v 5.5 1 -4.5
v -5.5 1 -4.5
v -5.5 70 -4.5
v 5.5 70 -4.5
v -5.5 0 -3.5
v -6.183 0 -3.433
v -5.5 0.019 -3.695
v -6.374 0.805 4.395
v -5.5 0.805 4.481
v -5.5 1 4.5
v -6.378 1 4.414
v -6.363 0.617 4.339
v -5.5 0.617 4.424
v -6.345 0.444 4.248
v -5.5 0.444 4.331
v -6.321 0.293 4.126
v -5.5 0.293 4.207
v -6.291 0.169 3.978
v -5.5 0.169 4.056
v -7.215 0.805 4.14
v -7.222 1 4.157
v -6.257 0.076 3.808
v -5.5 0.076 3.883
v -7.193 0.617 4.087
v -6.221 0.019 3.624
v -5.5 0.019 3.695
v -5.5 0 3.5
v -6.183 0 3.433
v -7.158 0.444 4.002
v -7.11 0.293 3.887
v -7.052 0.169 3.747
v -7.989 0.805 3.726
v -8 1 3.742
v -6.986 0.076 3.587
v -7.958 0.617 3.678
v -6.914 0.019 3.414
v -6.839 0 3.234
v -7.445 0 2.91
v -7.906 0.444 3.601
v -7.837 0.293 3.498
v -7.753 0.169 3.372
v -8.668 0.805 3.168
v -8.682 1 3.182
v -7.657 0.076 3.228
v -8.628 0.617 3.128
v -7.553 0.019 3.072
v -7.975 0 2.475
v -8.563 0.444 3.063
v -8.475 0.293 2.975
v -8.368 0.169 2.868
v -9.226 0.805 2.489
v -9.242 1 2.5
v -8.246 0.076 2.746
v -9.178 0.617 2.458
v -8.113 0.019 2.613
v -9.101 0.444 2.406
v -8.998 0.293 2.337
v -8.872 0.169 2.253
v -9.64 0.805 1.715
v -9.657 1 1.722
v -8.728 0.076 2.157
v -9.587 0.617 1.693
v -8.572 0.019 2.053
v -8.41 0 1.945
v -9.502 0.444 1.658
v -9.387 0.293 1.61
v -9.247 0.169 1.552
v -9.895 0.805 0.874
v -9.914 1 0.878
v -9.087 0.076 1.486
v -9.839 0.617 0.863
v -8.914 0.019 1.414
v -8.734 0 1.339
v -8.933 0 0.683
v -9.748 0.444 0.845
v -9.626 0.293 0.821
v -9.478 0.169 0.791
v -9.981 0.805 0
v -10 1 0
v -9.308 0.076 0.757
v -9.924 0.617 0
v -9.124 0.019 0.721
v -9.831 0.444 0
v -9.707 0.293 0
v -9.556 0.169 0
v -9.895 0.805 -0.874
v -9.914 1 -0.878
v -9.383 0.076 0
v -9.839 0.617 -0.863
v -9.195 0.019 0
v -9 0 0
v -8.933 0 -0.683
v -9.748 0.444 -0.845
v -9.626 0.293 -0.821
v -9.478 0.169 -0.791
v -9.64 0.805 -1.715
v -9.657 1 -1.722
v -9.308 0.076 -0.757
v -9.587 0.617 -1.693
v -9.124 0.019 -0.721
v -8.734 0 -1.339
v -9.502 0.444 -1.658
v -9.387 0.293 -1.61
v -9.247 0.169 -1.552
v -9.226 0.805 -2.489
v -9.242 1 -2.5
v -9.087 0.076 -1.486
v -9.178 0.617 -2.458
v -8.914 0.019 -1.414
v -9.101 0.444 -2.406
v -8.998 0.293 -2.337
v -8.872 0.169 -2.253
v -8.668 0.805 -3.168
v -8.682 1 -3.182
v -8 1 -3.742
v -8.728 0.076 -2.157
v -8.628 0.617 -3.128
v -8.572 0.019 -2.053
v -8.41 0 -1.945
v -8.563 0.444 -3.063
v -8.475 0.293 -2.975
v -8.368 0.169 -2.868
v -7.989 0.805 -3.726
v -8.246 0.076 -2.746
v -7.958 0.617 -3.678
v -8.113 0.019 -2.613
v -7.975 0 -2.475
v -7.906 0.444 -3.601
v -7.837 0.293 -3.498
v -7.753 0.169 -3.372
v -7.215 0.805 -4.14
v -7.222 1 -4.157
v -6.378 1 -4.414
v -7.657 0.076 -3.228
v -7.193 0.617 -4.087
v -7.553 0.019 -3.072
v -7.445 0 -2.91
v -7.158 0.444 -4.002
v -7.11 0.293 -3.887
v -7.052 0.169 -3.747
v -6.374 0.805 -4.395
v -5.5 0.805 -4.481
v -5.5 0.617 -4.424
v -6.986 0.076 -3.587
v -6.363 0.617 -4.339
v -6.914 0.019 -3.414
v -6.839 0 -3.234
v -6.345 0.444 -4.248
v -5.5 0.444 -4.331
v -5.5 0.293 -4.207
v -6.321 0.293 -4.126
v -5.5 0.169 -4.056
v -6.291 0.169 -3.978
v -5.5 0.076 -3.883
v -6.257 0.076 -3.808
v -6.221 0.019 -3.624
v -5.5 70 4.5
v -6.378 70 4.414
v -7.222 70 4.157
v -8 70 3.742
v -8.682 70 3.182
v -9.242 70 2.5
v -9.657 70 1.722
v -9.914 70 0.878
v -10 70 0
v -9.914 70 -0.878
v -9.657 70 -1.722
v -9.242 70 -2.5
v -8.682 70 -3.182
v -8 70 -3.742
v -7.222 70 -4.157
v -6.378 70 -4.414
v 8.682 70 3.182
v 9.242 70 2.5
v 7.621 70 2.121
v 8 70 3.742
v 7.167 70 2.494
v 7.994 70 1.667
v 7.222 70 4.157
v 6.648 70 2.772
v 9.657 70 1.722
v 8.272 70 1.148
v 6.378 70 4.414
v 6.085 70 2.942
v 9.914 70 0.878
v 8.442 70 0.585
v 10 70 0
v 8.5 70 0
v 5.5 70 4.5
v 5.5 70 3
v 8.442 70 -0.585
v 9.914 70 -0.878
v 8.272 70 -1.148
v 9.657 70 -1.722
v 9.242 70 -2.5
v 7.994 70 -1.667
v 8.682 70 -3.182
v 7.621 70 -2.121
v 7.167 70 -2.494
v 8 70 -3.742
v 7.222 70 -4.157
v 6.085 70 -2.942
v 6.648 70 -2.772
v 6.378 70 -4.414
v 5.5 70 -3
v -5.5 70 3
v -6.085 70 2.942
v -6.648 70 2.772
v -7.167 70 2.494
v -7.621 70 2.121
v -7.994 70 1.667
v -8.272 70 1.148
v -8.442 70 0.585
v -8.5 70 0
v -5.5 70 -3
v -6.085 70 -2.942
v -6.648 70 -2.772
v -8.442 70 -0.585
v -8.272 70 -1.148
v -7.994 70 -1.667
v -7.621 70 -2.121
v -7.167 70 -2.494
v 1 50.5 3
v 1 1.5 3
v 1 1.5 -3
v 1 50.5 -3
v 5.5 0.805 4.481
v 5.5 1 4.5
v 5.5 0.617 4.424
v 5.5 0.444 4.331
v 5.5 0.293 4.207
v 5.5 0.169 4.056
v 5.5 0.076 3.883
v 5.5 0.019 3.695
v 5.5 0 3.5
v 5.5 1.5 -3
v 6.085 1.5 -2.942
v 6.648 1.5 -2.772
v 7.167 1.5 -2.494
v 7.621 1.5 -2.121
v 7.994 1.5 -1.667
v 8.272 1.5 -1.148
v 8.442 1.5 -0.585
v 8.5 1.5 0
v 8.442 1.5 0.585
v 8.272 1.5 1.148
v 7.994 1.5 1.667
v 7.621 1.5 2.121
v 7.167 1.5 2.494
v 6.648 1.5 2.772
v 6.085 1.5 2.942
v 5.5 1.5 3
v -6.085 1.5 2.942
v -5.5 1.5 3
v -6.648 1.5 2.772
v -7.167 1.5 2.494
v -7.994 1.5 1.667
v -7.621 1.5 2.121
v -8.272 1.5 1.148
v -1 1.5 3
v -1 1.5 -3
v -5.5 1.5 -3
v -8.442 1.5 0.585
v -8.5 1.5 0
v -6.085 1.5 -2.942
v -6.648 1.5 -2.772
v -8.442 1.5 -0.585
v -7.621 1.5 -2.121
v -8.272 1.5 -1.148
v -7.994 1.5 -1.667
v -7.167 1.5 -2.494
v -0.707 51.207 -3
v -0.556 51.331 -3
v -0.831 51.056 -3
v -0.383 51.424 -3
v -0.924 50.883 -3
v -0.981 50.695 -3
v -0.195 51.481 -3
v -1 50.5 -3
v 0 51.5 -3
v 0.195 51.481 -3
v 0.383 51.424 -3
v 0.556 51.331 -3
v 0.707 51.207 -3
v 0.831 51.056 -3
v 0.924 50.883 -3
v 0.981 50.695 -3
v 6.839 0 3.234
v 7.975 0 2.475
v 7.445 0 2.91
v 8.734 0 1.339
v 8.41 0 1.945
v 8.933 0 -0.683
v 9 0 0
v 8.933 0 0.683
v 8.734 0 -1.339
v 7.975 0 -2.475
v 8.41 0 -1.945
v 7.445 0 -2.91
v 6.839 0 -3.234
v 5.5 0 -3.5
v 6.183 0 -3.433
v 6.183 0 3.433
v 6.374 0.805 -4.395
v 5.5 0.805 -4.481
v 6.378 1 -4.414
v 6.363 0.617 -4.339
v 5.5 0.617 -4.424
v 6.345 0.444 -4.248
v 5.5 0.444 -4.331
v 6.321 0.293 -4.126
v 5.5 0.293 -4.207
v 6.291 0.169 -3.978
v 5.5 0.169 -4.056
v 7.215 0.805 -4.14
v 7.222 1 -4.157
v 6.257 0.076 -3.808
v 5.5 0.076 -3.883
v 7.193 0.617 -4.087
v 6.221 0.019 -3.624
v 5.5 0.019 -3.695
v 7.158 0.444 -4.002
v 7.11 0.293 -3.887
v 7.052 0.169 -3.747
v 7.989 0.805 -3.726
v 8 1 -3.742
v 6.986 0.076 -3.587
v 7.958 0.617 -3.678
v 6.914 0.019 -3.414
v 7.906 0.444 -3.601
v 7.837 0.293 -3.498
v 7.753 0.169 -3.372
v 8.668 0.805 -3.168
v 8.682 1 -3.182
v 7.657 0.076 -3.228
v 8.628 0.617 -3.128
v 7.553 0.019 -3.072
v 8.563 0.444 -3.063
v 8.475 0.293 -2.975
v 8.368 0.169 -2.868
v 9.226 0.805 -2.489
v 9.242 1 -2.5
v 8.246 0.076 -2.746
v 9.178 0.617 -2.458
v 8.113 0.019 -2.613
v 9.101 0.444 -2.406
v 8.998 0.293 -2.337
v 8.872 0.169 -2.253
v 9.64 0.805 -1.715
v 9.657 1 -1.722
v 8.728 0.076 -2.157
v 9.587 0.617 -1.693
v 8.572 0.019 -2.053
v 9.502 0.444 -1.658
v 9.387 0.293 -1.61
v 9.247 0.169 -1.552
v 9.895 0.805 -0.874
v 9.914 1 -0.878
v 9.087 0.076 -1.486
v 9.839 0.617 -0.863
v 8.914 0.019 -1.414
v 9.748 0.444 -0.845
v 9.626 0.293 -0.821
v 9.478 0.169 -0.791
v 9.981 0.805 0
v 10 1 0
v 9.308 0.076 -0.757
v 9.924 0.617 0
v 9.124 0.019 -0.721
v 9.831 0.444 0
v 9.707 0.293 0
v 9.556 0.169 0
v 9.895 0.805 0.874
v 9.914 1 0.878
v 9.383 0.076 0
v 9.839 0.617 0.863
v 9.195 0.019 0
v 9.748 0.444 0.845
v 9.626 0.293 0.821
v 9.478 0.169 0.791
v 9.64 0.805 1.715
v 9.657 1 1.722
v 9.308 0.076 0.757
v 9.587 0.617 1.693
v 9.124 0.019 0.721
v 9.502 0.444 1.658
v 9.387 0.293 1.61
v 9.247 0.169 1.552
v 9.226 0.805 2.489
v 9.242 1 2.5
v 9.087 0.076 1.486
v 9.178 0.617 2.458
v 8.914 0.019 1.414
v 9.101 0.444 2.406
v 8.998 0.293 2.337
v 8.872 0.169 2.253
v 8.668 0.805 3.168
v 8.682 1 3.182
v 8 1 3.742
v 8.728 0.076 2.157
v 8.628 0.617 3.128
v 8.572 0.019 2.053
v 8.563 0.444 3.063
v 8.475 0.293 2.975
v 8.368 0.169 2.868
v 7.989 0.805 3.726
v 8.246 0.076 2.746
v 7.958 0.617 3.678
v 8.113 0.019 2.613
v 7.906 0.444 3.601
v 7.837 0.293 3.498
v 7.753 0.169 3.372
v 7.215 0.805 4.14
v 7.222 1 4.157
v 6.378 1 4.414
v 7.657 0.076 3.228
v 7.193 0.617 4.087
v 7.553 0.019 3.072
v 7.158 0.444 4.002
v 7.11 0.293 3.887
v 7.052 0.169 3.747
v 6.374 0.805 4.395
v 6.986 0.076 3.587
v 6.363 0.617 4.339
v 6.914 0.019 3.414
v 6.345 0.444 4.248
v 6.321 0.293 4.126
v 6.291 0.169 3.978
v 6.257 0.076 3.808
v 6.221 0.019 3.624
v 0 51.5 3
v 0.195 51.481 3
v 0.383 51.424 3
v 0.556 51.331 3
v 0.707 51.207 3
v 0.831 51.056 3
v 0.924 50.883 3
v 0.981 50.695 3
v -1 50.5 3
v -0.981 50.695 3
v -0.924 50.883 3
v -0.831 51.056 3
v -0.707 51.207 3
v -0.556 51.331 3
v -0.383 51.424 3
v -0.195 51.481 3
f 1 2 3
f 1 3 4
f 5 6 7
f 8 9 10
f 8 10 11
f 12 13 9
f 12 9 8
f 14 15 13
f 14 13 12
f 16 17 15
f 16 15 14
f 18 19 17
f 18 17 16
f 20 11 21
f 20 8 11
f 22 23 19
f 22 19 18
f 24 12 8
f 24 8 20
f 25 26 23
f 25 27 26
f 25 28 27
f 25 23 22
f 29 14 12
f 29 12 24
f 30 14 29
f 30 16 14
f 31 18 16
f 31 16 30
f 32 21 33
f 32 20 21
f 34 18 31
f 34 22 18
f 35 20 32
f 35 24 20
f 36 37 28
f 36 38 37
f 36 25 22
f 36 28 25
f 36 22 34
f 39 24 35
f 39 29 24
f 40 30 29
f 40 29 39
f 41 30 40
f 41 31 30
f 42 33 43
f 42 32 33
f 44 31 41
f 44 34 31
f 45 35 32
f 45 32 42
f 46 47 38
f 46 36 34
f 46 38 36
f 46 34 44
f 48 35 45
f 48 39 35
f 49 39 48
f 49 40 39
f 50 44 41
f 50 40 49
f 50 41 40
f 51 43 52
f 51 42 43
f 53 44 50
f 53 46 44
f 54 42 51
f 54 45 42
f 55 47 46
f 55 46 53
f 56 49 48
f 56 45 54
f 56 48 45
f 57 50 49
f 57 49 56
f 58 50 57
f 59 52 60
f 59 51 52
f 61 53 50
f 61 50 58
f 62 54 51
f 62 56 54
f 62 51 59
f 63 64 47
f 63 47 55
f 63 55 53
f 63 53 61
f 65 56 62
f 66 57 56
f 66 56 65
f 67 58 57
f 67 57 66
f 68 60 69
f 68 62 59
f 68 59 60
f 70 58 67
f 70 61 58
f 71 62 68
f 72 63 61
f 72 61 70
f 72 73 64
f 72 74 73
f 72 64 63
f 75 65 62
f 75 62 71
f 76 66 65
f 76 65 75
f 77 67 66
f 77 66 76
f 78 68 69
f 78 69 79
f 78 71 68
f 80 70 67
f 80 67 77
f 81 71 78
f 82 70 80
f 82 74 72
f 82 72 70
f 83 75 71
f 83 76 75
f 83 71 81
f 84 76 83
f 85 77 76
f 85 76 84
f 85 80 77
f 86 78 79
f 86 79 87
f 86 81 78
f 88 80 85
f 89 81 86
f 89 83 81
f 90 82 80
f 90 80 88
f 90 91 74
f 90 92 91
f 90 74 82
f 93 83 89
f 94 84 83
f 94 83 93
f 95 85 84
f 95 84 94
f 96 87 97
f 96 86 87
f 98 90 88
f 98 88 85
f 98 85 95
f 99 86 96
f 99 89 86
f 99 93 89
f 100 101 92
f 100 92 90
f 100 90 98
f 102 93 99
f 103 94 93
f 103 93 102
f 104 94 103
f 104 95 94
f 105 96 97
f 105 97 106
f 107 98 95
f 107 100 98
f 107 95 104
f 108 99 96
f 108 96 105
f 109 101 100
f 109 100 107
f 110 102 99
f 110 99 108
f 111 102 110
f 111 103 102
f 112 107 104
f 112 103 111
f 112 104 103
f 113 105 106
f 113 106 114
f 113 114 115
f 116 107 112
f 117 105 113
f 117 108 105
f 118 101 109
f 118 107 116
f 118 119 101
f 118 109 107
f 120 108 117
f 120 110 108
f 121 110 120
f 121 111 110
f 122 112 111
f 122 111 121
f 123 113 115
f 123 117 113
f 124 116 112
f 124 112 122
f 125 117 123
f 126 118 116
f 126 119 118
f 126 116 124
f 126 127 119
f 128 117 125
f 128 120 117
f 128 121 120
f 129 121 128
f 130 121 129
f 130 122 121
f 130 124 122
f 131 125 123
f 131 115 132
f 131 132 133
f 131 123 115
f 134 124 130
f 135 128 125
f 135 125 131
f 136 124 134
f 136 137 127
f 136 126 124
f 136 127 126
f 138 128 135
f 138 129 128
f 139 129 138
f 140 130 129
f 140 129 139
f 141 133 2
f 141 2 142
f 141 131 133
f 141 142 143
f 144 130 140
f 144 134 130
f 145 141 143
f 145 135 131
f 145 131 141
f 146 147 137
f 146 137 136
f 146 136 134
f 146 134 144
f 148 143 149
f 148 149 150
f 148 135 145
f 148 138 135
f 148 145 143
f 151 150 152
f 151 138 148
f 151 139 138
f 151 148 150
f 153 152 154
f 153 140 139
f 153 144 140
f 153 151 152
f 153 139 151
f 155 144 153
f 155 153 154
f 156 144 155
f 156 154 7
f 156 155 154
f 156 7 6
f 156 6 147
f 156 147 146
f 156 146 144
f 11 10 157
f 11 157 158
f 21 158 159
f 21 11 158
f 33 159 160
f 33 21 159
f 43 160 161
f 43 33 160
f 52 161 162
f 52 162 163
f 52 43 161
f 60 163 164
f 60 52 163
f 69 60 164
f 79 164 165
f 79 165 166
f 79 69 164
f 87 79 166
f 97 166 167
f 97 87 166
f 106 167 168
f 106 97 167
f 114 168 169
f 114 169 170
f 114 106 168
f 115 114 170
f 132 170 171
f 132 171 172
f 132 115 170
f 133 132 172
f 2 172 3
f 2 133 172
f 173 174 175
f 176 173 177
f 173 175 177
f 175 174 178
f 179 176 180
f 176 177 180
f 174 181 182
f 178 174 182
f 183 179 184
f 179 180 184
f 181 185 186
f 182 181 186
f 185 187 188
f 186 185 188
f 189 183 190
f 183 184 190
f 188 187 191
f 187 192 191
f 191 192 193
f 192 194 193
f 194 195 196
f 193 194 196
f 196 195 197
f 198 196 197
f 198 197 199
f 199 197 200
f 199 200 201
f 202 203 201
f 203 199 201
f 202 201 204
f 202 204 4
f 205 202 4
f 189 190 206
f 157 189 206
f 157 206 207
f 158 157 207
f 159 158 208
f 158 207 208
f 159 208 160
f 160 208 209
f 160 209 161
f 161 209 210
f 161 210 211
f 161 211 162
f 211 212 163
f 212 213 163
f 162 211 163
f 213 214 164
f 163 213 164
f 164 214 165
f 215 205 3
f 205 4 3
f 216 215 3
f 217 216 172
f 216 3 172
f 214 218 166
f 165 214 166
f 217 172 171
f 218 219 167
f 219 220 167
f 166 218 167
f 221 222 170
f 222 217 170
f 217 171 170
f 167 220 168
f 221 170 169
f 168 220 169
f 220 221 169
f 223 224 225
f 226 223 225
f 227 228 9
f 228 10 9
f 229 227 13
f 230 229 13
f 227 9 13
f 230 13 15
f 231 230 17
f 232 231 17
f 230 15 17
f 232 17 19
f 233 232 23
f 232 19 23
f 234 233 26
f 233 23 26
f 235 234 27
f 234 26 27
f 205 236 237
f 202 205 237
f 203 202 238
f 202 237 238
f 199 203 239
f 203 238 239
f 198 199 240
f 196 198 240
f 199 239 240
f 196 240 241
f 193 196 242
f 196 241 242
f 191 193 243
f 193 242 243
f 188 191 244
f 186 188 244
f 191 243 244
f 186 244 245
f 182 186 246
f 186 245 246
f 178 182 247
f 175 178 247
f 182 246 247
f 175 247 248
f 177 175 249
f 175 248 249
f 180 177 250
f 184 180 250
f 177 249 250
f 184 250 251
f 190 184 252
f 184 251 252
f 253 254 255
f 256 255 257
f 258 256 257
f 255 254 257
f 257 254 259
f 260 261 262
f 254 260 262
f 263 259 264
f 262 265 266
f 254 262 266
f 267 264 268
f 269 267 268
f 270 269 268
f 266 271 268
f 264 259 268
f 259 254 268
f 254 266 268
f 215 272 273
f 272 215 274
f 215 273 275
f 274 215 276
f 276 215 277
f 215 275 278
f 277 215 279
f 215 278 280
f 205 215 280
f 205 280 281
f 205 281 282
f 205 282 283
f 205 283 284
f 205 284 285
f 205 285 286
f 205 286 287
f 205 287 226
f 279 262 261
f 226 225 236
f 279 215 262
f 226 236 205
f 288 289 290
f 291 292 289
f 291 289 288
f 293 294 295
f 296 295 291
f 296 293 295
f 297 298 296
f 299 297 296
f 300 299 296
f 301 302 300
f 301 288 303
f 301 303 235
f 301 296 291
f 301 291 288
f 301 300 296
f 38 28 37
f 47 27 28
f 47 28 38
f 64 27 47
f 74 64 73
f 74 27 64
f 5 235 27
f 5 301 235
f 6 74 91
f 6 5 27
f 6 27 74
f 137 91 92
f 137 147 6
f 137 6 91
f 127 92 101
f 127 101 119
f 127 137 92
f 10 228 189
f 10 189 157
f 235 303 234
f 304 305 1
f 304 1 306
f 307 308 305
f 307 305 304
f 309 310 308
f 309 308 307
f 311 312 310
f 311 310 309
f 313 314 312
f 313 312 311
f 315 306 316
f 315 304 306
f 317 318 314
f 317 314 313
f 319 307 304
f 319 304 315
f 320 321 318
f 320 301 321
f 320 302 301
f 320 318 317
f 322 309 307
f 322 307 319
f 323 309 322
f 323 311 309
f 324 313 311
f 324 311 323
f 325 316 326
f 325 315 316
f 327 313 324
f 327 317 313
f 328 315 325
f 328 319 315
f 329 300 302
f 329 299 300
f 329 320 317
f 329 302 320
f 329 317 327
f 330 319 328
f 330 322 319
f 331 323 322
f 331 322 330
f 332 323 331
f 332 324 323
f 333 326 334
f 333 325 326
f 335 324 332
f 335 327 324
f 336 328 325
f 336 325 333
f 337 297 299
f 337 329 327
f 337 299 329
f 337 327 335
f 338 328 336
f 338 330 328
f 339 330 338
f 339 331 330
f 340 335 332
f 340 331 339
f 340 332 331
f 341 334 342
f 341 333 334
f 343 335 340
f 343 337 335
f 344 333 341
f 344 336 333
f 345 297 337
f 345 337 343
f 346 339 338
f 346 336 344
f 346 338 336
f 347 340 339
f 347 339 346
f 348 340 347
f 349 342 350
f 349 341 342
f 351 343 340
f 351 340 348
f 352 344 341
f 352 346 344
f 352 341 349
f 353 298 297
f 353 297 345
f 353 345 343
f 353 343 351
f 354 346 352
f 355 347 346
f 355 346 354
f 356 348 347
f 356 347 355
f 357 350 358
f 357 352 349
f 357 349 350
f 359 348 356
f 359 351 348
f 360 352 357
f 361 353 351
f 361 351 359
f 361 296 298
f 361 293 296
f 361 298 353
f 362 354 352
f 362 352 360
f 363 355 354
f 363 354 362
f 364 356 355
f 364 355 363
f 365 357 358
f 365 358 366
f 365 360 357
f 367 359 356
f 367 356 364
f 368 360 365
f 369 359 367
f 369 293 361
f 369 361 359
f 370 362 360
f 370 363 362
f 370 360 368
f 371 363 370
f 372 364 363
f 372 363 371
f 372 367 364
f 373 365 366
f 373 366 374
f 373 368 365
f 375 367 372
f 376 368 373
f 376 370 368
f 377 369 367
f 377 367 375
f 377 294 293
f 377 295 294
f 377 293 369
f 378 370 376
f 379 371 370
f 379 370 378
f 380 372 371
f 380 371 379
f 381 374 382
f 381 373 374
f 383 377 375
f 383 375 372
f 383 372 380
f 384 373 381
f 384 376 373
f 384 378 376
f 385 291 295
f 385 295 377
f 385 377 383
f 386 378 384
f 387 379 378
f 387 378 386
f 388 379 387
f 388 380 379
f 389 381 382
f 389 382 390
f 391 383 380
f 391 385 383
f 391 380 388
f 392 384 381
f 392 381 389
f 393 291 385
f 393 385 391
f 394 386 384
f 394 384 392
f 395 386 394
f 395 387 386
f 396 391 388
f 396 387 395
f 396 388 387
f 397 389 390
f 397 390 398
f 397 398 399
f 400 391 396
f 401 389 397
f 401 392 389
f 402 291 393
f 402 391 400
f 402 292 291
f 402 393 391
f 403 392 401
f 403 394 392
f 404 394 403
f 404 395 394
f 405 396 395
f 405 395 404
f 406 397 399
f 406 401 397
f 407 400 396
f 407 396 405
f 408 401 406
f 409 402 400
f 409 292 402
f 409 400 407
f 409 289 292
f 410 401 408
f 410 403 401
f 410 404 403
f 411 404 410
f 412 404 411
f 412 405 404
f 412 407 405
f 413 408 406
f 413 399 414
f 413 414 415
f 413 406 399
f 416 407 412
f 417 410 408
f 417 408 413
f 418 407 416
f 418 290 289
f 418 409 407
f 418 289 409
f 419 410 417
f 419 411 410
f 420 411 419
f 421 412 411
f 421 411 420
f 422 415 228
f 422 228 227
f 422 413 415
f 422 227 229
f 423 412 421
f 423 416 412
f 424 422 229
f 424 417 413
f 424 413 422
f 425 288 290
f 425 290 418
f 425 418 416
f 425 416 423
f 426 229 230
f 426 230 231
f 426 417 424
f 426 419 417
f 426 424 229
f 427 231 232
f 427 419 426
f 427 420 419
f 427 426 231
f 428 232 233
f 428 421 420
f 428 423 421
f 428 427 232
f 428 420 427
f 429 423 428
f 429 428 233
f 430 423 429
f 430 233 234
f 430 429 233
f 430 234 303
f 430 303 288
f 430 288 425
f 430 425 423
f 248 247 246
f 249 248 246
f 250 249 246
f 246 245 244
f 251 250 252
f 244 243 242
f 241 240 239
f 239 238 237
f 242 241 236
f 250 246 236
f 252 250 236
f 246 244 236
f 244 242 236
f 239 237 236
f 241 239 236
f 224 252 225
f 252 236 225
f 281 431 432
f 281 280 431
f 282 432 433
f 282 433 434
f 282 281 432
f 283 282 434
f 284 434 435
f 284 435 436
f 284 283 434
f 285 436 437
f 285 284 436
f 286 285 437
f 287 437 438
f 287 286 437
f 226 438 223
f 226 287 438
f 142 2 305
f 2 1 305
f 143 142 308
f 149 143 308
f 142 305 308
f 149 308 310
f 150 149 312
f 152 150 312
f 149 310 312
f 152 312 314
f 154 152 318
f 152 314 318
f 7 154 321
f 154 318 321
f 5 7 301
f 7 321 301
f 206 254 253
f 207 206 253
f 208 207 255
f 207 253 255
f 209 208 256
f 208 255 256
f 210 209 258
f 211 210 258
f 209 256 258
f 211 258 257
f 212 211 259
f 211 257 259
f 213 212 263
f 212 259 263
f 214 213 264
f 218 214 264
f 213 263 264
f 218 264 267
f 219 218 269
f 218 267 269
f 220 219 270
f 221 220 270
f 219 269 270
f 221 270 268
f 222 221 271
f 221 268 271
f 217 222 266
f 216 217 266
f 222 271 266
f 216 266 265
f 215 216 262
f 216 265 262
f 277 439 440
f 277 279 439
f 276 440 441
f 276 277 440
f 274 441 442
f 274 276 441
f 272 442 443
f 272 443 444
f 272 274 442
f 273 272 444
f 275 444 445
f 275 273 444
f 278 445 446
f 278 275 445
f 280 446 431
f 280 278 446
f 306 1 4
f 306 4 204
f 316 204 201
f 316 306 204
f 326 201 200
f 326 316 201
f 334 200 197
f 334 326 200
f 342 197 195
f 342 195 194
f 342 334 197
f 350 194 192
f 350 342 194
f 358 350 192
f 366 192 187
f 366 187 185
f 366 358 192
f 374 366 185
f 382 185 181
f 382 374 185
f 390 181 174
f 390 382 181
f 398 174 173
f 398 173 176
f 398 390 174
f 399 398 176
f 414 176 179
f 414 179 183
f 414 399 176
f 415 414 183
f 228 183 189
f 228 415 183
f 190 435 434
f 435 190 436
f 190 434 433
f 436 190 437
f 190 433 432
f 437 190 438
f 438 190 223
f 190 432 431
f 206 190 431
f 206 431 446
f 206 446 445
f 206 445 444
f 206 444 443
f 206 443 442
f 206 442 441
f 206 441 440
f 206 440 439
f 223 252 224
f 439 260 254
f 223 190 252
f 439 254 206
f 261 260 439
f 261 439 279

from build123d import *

# Parameters (mm, degrees)
DODANIE_WYCI_GNI_CIE1_DEPTH = 70
SKORUPA1_T                  = -1.5
SZKIC2_W                    = 2
SZKIC2_H                    = 6
DODANIE_WYCI_GNI_CIE2_DEPTH = 50
ZAOKR_GLENIE2_R             = 1


with BuildPart() as part:
    # Szkic1 → Dodanie-wyciągnięcie1 (new body)
    with BuildSketch(Plane(origin=(0, 0, 0), x_dir=(1, 0, 0), z_dir=(0, 1, 0))):
        with BuildLine():
            Line((-5.5, 4.5), (5.5, 4.5))
            ThreePointArc((5.5, 4.5), (10, 0), (5.5, -4.5))
            Line((5.5, -4.5), (-5.5, -4.5))
            ThreePointArc((-5.5, -4.5), (-10, 0), (-5.5, 4.5))
        make_face()
    extrude(amount=DODANIE_WYCI_GNI_CIE1_DEPTH)

    # Skorupa1
    skorupa1_openings = [part.faces().sort_by_distance(p)[0] for p in [
        (0, 70, 0),
    ]]
    offset(amount=SKORUPA1_T, openings=skorupa1_openings, kind=Kind.INTERSECTION)

    # Szkic2 → Dodanie-wyciągnięcie2 (add)
    with BuildSketch(Plane(origin=(0, 1.5, 0), x_dir=(1, 0, 0), z_dir=(0, 1, 0))):
        Rectangle(SZKIC2_W, SZKIC2_H)
    extrude(amount=DODANIE_WYCI_GNI_CIE2_DEPTH)

    # Zaokrąglenie2
    zaokr_glenie2_edges = [part.edges().sort_by_distance(p)[0] for p in [
        (0, 0, -4.5),
        (10, 0, 0),
        (0, 0, 4.5),
        (-10, 0, 0),
        (-1, 51.5, 0),
        (1, 51.5, 0),
    ]]
    fillet(zaokr_glenie2_edges, radius=ZAOKR_GLENIE2_R - 0.0001)  # a hair under: the kernel refuses the full size


solid = part.part
